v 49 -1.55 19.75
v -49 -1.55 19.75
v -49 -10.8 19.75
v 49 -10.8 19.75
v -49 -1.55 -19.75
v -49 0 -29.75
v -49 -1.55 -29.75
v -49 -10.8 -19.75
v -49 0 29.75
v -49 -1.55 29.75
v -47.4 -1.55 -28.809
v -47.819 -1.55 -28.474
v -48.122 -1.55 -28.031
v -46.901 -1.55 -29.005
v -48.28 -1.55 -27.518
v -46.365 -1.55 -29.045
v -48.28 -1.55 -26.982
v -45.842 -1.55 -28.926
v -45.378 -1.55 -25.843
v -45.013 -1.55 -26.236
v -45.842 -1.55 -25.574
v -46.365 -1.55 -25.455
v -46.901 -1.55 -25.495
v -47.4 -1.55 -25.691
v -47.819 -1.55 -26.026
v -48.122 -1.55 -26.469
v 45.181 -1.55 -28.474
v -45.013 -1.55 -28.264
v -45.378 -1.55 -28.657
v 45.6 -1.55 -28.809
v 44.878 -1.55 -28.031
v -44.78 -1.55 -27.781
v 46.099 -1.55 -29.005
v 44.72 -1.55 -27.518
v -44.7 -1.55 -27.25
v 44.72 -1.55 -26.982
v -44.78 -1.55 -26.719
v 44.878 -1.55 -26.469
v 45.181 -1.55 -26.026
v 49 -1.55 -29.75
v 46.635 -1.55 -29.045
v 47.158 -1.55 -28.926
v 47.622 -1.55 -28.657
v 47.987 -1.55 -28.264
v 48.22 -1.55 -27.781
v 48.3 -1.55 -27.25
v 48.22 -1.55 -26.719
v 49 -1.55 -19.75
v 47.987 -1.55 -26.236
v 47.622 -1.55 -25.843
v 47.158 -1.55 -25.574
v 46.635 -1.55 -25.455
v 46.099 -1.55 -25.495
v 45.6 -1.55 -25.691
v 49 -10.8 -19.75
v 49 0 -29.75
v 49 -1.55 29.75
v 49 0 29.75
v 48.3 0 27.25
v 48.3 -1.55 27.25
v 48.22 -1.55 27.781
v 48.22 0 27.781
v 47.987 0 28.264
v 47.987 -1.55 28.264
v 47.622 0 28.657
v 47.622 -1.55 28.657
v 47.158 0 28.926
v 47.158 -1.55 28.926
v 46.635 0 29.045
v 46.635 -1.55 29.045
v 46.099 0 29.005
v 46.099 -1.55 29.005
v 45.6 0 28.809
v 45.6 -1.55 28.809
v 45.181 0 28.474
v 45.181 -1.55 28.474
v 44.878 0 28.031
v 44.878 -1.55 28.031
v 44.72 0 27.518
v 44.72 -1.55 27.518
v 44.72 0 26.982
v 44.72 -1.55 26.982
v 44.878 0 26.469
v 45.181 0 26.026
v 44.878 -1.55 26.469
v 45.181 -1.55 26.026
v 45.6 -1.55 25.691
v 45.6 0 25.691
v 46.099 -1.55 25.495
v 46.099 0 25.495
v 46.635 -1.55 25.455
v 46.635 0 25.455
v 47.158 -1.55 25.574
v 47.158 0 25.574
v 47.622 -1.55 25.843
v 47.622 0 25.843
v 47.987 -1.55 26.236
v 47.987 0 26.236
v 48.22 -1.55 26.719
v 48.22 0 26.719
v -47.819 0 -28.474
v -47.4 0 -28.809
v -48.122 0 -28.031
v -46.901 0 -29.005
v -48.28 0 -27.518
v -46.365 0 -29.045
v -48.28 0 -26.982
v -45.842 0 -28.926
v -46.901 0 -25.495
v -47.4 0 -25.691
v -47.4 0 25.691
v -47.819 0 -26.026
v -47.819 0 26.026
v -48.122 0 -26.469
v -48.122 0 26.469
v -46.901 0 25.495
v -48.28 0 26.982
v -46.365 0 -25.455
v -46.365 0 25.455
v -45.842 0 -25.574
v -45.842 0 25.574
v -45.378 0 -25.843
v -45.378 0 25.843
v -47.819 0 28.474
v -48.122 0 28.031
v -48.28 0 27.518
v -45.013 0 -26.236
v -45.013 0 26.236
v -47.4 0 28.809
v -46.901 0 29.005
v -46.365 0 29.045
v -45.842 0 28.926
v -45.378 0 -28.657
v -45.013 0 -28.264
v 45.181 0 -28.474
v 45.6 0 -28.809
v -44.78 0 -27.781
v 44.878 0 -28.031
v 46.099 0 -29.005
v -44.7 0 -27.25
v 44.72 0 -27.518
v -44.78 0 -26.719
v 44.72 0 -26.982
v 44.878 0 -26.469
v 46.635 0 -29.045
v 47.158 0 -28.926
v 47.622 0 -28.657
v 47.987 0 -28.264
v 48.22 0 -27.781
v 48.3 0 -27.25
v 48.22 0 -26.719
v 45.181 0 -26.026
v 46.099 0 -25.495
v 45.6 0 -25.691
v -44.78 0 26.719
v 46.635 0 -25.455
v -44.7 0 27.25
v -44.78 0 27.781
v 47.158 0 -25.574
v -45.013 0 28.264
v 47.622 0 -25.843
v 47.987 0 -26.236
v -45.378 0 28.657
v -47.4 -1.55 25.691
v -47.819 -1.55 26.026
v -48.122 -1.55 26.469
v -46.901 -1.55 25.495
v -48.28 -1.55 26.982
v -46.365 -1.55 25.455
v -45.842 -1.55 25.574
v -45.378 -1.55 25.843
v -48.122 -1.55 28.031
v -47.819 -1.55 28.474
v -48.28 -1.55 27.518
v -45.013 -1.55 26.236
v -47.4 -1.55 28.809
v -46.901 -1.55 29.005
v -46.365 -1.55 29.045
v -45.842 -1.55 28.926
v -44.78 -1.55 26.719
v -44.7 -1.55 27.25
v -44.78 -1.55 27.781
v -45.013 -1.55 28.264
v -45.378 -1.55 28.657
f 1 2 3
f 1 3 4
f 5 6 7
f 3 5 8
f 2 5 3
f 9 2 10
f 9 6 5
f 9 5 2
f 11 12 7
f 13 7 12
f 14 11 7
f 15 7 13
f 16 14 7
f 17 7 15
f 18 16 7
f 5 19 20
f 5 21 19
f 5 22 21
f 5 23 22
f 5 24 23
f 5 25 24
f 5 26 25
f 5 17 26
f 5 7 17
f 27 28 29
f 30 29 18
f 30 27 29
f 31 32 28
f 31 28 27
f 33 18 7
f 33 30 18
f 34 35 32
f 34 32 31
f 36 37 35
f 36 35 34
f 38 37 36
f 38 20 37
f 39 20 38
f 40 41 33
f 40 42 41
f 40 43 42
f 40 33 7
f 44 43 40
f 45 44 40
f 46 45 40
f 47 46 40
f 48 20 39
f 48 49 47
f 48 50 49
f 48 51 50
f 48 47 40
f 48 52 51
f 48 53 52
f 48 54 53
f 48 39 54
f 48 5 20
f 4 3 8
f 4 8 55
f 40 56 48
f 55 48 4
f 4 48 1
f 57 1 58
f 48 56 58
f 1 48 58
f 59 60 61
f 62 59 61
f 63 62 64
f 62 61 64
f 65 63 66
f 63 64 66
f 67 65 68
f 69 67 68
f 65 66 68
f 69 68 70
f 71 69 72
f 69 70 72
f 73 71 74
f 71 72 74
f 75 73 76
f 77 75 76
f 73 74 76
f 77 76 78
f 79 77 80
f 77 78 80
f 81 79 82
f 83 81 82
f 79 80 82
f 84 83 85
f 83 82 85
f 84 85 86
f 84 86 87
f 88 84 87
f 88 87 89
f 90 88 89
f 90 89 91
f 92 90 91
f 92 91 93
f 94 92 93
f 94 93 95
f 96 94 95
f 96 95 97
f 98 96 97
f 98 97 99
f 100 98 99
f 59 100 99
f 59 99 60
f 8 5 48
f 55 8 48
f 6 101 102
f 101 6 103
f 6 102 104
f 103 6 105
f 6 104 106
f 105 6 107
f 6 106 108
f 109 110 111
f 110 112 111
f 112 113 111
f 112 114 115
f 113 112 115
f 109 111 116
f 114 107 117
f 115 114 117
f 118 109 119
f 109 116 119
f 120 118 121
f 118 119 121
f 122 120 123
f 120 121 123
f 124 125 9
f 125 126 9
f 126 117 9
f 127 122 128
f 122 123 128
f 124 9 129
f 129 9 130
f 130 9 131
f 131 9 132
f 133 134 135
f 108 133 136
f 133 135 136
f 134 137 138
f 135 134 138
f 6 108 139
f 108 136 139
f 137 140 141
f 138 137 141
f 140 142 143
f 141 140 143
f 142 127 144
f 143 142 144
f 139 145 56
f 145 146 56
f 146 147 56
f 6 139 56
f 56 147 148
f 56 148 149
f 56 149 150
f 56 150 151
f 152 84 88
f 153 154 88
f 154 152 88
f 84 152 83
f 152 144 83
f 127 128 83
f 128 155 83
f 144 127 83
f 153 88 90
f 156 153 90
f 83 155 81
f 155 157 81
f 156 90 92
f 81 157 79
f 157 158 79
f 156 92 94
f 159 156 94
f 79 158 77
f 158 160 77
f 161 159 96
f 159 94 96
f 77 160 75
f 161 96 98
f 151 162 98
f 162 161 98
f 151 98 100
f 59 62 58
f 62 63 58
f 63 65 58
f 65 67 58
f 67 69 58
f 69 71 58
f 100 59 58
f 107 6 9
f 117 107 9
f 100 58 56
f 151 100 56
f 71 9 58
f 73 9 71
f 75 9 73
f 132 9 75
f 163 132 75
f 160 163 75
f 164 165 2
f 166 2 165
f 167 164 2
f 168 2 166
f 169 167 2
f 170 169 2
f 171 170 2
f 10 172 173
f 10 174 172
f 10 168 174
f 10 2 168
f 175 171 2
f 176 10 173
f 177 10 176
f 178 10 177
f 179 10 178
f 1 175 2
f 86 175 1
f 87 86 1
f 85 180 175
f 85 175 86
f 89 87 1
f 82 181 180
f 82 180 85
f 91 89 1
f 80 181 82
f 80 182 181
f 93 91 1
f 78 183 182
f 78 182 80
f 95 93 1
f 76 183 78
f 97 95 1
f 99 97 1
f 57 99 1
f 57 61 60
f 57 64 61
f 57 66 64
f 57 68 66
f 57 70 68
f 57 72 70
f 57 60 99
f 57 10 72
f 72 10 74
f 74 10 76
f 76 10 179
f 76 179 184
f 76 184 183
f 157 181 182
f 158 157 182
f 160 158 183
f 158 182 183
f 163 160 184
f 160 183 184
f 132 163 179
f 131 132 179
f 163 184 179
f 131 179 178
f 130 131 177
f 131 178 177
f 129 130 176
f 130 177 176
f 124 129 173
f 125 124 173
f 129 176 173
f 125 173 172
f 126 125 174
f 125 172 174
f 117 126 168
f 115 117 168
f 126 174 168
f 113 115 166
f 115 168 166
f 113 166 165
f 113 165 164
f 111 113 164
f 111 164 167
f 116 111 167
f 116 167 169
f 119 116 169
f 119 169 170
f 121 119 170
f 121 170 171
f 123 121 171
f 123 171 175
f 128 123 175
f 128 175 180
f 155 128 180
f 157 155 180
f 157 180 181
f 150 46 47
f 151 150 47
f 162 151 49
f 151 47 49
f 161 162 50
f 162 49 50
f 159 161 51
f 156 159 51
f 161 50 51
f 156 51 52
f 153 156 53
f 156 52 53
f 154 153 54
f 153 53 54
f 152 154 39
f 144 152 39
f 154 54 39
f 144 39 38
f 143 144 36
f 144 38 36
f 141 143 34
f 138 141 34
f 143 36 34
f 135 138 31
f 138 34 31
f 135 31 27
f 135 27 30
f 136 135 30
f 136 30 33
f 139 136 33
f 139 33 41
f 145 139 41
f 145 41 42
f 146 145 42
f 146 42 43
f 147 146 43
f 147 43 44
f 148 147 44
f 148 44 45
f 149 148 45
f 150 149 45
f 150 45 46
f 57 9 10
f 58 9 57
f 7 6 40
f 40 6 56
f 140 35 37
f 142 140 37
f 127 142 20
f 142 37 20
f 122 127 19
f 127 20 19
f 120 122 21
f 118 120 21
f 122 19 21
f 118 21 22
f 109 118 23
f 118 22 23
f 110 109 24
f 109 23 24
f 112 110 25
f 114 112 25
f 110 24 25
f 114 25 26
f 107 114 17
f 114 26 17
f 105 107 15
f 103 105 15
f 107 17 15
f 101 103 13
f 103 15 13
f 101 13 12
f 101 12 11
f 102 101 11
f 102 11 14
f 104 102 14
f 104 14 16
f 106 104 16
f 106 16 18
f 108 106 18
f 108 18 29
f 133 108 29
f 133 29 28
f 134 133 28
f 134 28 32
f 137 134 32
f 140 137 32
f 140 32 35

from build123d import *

# Parameters (mm, degrees)
F0_W     = 98
F0_H     = 59.5
F1_DEPTH = 1.55
F2_W     = 98
F2_H     = 39.5
F3_DEPTH = 9.25
F4_R     = 1.8
F5_DEPTH = 25


with BuildPart() as f1:
    # F0 (on Front) → F1 (new body)
    with BuildSketch(Plane.XZ):
        Rectangle(F0_W, F0_H)
    extrude(amount=F1_DEPTH)

    # F2 (on face) → F3 (join)
    with BuildSketch(Plane.XZ.offset(1.55)):
        Rectangle(F2_W, F2_H)
    extrude(amount=F3_DEPTH)

    # F4 (on face) → F5 (cut)
    with BuildSketch(Plane.XZ.offset(1.55)):
        with Locations((-46.5, 27.25)):
            Circle(F4_R)
        with Locations((-46.5, -27.25)):
            Circle(F4_R)
        with Locations((46.5, -27.25)):
            Circle(F4_R)
        with Locations((46.5, 27.25)):
            Circle(F4_R)
    extrude(amount=-F5_DEPTH, mode=Mode.SUBTRACT)


solid = f1.part
